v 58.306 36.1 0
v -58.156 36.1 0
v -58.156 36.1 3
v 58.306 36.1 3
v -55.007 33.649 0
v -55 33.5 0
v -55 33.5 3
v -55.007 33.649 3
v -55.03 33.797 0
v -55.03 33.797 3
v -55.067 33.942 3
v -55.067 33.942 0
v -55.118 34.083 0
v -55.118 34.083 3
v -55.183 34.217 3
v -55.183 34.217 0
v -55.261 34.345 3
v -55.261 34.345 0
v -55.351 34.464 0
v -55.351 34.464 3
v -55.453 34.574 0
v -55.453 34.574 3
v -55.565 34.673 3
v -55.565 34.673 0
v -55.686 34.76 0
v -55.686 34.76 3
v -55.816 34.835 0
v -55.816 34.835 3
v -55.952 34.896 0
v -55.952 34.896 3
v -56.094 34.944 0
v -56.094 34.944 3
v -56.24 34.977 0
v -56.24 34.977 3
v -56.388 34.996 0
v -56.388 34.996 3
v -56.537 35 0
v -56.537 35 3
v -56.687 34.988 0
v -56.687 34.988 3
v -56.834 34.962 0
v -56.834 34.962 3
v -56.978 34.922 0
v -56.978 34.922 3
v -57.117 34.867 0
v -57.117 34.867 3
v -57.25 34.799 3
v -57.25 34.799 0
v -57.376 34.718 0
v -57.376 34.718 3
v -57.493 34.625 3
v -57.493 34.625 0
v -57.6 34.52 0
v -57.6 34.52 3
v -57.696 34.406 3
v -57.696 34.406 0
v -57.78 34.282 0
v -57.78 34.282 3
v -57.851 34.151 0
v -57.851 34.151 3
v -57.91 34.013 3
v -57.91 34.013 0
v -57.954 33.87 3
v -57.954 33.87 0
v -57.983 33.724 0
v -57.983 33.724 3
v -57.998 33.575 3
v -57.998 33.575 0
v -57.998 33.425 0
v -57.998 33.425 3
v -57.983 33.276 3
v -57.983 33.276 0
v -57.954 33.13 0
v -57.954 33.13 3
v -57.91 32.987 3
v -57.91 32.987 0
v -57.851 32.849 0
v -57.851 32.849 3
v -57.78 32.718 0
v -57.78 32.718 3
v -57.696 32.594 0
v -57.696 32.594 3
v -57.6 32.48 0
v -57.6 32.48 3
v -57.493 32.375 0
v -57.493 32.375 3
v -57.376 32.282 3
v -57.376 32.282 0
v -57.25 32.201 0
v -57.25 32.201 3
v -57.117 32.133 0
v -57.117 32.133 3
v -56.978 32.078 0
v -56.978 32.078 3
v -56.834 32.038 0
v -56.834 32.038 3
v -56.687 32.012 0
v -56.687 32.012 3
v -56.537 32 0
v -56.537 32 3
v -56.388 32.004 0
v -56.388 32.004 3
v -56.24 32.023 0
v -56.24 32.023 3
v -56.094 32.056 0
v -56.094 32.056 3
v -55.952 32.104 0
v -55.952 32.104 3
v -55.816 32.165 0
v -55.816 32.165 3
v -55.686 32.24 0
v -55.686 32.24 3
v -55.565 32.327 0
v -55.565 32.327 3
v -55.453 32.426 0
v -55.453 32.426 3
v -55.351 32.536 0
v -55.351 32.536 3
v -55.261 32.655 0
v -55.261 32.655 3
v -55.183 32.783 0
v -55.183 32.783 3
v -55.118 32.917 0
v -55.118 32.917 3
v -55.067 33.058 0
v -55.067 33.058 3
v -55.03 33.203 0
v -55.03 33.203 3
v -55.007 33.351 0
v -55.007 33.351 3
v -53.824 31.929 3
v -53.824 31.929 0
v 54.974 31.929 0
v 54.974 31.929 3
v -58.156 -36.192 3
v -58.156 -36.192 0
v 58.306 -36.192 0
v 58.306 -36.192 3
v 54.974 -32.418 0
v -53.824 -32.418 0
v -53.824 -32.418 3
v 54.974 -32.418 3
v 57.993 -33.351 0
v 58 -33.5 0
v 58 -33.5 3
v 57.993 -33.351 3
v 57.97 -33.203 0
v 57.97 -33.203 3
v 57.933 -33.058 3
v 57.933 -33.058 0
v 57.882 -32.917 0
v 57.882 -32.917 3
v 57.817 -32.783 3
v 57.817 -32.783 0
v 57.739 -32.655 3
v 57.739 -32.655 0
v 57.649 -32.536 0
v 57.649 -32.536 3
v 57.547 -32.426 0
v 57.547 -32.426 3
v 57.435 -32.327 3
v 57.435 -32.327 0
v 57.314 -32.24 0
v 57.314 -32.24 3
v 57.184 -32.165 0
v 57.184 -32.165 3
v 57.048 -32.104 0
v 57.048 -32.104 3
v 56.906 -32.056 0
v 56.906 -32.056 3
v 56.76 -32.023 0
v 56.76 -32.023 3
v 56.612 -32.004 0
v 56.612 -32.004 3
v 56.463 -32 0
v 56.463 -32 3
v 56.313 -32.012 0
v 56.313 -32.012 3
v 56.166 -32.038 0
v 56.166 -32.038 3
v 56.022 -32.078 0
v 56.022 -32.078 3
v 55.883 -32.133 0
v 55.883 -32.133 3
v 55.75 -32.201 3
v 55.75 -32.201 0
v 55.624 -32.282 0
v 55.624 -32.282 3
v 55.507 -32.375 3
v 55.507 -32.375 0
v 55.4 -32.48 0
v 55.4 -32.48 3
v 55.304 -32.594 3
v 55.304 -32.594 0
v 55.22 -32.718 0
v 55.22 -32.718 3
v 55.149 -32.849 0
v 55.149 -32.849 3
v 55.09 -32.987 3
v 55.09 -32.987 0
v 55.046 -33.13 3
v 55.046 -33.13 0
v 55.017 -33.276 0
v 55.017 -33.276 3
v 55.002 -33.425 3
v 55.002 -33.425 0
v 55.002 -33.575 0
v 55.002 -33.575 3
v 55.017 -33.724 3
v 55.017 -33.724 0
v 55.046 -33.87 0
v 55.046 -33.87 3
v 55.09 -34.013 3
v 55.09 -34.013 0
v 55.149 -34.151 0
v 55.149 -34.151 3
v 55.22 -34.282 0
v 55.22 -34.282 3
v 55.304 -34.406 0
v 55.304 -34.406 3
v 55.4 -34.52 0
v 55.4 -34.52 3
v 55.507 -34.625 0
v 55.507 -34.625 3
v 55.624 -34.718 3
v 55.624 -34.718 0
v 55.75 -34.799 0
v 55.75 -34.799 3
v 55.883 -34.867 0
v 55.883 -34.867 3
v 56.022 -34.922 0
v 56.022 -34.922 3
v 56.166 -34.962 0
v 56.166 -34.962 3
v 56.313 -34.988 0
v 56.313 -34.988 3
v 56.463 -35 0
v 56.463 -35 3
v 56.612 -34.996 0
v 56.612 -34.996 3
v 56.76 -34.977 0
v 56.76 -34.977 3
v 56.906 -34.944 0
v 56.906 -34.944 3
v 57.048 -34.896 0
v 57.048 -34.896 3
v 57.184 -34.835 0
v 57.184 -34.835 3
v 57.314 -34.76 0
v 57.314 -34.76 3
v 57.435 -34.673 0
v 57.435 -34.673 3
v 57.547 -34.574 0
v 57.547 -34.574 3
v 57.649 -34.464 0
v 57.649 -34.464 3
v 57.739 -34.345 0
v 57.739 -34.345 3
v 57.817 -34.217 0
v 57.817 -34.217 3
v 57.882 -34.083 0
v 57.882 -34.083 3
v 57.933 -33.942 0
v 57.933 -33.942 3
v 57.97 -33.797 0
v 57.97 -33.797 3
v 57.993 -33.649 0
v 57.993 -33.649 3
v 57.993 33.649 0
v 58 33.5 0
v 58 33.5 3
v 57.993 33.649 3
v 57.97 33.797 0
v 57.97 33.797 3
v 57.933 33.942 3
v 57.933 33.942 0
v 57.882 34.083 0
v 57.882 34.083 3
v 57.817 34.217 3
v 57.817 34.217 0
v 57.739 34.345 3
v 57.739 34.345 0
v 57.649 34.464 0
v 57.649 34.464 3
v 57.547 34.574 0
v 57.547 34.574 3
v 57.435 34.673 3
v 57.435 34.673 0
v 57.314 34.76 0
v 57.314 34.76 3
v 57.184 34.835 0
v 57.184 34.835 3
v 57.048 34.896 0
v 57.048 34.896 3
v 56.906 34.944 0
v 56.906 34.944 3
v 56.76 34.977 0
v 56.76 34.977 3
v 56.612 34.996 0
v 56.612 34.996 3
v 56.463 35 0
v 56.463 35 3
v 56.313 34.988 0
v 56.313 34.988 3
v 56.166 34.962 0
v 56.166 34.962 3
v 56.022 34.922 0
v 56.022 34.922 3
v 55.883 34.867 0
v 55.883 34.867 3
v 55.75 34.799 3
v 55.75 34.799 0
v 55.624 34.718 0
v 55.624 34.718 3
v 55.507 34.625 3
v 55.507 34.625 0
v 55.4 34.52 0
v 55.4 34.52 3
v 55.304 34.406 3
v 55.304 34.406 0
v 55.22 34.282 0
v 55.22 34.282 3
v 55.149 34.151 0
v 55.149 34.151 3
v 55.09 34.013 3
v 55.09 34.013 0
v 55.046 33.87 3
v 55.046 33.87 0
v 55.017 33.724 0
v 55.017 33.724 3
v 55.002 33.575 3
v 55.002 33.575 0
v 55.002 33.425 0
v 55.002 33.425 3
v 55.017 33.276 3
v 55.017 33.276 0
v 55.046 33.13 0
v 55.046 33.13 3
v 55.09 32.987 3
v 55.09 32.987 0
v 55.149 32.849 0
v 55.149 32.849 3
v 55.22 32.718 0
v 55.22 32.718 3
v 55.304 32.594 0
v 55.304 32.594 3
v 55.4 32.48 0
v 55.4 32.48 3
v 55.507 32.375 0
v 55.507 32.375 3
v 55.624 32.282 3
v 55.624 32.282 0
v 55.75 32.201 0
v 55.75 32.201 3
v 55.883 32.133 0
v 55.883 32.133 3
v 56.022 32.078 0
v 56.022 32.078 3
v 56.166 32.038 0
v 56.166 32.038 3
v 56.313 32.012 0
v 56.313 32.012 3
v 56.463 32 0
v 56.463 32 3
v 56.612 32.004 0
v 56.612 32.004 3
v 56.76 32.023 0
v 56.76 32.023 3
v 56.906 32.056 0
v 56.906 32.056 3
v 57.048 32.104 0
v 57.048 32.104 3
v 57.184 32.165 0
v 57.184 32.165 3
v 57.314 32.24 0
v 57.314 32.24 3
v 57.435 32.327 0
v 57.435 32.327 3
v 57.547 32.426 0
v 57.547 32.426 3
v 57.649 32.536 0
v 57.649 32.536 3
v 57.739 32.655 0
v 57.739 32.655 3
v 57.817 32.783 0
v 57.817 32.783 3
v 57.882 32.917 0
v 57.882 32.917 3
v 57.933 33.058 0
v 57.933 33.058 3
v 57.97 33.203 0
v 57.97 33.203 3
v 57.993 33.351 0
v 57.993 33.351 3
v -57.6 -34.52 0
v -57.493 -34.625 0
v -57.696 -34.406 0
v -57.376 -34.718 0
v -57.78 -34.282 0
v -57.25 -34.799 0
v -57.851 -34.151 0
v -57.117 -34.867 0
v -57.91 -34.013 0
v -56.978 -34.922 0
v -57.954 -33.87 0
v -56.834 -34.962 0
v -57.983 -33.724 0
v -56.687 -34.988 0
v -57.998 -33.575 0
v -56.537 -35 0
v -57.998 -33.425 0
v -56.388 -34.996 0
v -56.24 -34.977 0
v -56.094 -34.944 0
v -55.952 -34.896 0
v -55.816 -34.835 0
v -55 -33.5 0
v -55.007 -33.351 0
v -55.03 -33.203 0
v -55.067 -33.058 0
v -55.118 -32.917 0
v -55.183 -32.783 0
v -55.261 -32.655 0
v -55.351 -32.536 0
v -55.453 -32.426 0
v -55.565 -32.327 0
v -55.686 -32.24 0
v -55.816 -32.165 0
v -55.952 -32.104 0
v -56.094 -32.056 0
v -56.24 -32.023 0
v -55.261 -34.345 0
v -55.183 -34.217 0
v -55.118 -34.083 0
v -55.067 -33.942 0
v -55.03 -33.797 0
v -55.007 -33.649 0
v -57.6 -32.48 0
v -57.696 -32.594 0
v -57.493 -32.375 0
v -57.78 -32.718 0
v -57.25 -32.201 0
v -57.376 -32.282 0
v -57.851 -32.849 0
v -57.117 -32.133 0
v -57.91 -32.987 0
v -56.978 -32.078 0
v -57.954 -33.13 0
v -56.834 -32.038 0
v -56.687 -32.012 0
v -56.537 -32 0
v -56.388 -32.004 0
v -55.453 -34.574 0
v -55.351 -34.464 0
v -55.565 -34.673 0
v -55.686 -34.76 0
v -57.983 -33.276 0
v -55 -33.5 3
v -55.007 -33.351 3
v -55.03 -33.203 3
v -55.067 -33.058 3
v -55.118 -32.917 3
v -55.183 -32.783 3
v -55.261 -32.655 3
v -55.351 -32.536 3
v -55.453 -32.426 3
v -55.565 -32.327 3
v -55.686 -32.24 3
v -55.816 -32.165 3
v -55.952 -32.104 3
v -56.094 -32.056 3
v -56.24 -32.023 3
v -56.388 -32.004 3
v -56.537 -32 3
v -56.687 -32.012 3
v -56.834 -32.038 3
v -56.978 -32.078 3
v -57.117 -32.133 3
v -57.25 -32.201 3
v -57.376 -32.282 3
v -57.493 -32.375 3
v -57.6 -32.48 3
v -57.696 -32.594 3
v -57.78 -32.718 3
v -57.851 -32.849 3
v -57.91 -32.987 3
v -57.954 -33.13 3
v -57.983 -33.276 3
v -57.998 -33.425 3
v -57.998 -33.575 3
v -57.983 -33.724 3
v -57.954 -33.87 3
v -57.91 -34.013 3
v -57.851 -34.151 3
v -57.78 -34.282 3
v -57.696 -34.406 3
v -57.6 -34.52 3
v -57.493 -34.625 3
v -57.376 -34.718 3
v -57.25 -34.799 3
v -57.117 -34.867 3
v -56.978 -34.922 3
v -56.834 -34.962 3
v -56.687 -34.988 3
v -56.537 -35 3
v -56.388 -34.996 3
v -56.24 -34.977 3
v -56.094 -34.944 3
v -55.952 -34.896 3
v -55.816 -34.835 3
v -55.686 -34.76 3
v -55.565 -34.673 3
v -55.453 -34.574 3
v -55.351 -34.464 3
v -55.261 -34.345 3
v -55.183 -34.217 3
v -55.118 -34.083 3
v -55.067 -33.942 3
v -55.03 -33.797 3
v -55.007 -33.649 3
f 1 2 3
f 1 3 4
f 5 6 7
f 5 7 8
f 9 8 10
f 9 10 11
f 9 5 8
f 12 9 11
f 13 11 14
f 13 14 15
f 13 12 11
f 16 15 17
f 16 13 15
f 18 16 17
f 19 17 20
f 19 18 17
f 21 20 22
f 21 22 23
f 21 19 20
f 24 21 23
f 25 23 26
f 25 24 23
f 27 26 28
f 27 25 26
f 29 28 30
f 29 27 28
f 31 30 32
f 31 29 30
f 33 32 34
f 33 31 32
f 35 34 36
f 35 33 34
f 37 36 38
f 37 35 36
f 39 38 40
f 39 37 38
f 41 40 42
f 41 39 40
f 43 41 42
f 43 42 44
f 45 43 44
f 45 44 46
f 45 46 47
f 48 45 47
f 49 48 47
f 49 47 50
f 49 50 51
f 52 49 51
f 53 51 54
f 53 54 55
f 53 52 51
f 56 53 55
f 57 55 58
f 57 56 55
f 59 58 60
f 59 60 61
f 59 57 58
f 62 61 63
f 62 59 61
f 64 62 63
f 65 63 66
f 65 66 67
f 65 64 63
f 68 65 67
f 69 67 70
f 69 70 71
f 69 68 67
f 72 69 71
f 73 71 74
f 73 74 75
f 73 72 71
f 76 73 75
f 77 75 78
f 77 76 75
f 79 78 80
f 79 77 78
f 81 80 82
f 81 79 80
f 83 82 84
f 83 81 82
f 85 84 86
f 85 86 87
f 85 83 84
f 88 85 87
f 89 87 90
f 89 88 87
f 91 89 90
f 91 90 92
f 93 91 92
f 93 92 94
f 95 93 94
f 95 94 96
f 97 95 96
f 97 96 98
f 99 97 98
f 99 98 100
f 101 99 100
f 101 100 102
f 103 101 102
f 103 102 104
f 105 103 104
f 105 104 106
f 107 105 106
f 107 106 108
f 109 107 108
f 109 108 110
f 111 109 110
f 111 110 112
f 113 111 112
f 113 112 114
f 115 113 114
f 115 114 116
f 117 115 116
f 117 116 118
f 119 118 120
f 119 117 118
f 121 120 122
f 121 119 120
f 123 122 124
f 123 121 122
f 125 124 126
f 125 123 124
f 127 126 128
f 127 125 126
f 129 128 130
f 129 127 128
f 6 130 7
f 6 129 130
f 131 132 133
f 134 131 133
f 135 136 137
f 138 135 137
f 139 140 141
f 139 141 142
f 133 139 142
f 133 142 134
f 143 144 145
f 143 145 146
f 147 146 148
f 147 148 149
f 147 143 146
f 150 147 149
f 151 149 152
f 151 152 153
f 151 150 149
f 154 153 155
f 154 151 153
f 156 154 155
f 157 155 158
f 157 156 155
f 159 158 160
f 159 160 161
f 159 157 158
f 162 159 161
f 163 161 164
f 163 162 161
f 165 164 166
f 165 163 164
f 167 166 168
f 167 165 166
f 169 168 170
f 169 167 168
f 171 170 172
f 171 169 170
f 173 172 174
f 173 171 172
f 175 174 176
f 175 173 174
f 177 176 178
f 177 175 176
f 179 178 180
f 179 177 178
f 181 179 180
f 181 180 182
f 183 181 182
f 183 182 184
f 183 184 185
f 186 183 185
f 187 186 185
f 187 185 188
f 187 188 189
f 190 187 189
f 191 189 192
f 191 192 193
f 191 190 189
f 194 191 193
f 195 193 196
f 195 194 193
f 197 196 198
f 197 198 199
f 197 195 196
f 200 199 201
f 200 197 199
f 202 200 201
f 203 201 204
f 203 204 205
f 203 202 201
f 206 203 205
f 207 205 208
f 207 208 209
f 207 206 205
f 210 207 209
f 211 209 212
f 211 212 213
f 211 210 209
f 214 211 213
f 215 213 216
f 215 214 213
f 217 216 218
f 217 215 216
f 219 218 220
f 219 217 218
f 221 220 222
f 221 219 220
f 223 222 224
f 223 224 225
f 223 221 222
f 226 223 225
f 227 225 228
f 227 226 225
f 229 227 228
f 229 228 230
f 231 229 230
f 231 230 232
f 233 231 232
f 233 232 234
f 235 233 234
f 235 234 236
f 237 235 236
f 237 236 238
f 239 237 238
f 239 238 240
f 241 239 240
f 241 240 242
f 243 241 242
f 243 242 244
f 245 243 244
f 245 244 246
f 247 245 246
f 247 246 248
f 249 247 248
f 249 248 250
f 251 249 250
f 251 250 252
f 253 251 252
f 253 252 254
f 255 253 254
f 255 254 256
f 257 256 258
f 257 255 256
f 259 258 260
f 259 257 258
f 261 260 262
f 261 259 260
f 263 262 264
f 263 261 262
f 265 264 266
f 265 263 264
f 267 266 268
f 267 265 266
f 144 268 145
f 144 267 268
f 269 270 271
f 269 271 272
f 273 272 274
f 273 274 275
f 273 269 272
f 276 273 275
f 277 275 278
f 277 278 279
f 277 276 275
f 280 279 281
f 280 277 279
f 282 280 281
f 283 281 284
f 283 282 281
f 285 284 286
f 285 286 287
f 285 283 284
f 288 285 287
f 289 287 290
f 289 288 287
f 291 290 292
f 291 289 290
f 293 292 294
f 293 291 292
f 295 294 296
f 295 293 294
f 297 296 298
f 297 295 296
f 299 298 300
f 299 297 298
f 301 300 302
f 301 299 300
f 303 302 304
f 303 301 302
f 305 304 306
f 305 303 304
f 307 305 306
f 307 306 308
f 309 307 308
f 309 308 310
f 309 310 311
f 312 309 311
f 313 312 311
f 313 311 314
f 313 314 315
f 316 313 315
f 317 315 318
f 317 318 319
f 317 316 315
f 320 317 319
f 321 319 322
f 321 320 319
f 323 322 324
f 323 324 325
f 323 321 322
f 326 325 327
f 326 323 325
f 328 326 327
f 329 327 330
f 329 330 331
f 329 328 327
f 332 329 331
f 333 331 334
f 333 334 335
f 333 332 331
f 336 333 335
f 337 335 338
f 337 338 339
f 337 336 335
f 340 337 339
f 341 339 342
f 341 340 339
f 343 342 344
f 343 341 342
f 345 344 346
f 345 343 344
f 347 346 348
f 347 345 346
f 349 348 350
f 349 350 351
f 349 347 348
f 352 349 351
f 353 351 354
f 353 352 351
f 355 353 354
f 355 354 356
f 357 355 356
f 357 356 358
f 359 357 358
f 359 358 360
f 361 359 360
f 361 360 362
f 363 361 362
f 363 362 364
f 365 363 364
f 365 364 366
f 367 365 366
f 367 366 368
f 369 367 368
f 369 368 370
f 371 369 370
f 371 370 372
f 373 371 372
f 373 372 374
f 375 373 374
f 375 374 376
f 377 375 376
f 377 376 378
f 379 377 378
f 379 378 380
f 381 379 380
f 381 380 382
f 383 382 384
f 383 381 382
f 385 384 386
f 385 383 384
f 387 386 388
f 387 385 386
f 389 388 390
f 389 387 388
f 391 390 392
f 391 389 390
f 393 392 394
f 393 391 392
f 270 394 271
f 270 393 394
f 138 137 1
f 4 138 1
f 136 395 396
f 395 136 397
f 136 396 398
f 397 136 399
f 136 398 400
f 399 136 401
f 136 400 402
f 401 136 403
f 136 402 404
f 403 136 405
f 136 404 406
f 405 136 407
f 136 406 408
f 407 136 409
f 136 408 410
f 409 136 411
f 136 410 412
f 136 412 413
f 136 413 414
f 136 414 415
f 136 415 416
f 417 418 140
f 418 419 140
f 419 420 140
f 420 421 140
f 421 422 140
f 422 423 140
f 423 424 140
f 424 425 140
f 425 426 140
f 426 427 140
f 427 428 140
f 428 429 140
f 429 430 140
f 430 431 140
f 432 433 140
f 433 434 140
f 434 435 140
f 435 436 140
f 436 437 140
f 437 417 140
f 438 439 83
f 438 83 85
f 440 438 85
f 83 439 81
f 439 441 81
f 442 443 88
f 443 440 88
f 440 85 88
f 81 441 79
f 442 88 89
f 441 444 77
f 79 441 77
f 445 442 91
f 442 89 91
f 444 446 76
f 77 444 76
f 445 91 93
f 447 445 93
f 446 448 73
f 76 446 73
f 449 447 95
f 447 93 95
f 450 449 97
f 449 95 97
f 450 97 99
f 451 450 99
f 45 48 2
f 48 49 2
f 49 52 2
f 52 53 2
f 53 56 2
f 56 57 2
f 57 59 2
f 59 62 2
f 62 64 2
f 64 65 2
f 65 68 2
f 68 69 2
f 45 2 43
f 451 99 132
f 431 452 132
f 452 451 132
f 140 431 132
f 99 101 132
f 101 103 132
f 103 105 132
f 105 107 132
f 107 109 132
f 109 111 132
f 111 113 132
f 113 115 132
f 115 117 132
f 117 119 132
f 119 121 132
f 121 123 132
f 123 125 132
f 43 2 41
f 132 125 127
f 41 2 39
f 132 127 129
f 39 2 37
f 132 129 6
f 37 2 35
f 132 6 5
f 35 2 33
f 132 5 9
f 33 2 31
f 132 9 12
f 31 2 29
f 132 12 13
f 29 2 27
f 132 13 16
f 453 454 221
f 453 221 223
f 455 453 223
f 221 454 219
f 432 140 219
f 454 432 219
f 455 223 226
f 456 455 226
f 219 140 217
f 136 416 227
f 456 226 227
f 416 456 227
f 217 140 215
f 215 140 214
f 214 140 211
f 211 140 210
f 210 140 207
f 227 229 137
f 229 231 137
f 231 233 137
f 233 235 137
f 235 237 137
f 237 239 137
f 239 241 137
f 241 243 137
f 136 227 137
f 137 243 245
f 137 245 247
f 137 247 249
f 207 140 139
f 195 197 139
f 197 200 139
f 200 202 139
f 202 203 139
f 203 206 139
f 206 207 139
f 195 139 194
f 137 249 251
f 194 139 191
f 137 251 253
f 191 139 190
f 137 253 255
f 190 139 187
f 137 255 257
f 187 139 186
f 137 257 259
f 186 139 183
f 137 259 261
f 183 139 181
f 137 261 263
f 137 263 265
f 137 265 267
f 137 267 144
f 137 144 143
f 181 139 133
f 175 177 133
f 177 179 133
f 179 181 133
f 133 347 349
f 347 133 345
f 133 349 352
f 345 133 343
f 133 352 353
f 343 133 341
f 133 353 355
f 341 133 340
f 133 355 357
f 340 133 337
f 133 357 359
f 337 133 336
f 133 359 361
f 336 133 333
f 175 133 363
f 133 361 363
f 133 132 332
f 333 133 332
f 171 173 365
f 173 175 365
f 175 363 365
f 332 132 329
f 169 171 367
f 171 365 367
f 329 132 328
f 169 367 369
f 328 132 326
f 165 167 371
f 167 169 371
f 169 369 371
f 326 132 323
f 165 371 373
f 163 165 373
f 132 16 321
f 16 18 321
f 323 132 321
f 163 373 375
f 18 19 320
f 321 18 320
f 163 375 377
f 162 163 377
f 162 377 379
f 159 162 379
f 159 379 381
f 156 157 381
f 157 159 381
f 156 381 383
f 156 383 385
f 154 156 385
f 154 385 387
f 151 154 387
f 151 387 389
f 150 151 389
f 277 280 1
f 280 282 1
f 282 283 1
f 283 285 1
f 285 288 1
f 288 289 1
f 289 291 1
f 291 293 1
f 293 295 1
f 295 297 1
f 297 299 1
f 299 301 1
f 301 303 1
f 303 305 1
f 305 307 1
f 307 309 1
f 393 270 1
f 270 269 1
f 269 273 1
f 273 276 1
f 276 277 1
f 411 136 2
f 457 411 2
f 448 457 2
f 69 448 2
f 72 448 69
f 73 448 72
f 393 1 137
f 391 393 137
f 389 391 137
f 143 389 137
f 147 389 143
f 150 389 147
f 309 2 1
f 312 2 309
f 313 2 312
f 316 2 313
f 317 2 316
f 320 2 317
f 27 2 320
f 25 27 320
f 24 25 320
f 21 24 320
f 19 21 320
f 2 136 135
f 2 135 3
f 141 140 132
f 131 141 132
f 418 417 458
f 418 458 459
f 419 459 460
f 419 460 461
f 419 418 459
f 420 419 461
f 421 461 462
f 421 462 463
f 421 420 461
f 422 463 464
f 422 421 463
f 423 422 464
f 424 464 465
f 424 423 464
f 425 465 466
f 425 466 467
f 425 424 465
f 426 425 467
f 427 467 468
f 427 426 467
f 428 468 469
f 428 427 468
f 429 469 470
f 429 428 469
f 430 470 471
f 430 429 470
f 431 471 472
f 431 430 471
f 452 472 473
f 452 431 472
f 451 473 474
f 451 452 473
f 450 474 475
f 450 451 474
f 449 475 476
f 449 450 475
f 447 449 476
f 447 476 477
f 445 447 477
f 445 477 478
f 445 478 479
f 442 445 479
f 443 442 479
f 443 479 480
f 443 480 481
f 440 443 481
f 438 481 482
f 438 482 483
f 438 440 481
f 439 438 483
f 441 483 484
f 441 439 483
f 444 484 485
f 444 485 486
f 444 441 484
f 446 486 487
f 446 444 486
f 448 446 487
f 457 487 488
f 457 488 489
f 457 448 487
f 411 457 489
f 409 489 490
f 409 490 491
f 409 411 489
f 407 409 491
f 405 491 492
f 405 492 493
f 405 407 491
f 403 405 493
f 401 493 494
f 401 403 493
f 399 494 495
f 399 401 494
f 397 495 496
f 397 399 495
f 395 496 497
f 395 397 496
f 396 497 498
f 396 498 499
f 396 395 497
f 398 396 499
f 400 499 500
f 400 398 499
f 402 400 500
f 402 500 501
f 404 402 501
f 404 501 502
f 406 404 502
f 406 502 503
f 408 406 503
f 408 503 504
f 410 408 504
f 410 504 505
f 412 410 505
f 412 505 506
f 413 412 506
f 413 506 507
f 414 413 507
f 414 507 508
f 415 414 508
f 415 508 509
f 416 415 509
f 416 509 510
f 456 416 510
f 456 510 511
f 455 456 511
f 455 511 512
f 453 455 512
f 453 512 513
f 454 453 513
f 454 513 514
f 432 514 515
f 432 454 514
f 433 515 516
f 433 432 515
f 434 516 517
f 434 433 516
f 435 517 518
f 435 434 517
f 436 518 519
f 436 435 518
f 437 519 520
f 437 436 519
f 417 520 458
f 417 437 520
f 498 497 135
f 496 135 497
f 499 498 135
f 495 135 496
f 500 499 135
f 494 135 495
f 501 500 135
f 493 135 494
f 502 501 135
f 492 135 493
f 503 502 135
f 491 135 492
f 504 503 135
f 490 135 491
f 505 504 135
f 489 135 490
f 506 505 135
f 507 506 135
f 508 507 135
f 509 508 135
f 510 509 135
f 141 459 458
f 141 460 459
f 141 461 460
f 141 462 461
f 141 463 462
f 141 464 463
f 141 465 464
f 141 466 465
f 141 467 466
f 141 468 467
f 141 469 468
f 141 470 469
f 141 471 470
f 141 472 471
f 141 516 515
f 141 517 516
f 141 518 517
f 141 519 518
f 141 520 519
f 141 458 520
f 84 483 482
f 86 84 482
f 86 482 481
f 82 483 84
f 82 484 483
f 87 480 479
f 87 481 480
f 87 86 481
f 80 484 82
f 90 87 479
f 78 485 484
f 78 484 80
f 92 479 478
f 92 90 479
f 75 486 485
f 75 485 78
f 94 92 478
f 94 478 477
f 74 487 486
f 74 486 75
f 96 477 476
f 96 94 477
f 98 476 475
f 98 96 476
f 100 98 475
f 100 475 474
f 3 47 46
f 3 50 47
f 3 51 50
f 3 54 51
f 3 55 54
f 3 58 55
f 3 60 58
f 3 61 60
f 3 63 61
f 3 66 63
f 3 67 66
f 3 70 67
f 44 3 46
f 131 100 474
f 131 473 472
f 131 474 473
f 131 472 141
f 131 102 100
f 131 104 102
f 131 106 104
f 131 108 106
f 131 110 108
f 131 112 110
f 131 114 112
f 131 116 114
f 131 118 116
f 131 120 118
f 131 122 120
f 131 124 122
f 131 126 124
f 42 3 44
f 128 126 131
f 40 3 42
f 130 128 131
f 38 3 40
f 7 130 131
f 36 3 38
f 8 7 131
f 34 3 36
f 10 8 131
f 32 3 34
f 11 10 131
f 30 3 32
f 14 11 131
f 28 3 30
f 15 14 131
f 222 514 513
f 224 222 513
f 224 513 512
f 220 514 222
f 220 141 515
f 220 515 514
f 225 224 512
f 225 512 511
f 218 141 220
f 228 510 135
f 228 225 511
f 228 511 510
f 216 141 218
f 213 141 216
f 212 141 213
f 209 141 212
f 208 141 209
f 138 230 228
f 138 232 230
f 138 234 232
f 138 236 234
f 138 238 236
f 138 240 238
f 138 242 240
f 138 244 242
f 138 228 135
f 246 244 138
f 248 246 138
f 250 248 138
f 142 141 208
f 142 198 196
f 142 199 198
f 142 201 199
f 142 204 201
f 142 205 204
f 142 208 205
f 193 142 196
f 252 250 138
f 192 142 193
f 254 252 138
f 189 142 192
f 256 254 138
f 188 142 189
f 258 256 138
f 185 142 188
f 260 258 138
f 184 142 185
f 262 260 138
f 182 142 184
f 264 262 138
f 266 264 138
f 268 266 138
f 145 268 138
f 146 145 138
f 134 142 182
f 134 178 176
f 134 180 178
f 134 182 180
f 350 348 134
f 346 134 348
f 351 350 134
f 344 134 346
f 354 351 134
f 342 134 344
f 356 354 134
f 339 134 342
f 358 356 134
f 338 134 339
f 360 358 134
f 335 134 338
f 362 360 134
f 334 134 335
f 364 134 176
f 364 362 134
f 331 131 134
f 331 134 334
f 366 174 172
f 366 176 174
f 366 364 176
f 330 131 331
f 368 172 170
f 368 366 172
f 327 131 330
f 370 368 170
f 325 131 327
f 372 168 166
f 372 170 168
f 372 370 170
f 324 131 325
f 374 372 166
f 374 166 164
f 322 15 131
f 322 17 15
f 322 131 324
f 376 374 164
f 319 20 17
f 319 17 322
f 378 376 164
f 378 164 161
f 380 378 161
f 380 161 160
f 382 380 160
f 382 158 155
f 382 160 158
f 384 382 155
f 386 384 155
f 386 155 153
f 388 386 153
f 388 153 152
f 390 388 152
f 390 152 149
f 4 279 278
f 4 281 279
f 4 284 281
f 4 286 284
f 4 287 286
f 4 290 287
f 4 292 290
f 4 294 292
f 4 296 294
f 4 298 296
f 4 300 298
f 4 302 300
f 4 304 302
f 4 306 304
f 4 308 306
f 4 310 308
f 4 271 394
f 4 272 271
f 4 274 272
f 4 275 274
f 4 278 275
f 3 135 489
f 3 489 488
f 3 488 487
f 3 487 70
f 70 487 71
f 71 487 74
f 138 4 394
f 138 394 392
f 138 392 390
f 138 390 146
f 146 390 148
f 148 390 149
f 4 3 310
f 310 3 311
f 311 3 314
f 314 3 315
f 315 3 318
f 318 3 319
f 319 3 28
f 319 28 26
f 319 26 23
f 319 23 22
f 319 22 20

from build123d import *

# Parameters (mm, degrees)
F0_W     = 116.462328
F0_H     = 72.291564
F0_R     = 1.5
F0_W_2   = 108.797777
F0_H_2   = 64.347155
F1_DEPTH = 3


with BuildPart() as f1:
    # F0 (on Top) → F1 (new body)
    with BuildSketch(Plane.XY):
        with Locations((0.074979, -0.045983)):
            Rectangle(F0_W, F0_H)
        with Locations((-56.5, -33.5)):
            Circle(F0_R, mode=Mode.SUBTRACT)
        with Locations((56.5, -33.5)):
            Circle(F0_R, mode=Mode.SUBTRACT)
        with Locations((0.575187, -0.244237)):
            Rectangle(F0_W_2, F0_H_2, mode=Mode.SUBTRACT)
        with Locations((-56.5, 33.5)):
            Circle(F0_R, mode=Mode.SUBTRACT)
        with Locations((56.5, 33.5)):
            Circle(F0_R, mode=Mode.SUBTRACT)
    extrude(amount=F1_DEPTH)


solid = f1.part
